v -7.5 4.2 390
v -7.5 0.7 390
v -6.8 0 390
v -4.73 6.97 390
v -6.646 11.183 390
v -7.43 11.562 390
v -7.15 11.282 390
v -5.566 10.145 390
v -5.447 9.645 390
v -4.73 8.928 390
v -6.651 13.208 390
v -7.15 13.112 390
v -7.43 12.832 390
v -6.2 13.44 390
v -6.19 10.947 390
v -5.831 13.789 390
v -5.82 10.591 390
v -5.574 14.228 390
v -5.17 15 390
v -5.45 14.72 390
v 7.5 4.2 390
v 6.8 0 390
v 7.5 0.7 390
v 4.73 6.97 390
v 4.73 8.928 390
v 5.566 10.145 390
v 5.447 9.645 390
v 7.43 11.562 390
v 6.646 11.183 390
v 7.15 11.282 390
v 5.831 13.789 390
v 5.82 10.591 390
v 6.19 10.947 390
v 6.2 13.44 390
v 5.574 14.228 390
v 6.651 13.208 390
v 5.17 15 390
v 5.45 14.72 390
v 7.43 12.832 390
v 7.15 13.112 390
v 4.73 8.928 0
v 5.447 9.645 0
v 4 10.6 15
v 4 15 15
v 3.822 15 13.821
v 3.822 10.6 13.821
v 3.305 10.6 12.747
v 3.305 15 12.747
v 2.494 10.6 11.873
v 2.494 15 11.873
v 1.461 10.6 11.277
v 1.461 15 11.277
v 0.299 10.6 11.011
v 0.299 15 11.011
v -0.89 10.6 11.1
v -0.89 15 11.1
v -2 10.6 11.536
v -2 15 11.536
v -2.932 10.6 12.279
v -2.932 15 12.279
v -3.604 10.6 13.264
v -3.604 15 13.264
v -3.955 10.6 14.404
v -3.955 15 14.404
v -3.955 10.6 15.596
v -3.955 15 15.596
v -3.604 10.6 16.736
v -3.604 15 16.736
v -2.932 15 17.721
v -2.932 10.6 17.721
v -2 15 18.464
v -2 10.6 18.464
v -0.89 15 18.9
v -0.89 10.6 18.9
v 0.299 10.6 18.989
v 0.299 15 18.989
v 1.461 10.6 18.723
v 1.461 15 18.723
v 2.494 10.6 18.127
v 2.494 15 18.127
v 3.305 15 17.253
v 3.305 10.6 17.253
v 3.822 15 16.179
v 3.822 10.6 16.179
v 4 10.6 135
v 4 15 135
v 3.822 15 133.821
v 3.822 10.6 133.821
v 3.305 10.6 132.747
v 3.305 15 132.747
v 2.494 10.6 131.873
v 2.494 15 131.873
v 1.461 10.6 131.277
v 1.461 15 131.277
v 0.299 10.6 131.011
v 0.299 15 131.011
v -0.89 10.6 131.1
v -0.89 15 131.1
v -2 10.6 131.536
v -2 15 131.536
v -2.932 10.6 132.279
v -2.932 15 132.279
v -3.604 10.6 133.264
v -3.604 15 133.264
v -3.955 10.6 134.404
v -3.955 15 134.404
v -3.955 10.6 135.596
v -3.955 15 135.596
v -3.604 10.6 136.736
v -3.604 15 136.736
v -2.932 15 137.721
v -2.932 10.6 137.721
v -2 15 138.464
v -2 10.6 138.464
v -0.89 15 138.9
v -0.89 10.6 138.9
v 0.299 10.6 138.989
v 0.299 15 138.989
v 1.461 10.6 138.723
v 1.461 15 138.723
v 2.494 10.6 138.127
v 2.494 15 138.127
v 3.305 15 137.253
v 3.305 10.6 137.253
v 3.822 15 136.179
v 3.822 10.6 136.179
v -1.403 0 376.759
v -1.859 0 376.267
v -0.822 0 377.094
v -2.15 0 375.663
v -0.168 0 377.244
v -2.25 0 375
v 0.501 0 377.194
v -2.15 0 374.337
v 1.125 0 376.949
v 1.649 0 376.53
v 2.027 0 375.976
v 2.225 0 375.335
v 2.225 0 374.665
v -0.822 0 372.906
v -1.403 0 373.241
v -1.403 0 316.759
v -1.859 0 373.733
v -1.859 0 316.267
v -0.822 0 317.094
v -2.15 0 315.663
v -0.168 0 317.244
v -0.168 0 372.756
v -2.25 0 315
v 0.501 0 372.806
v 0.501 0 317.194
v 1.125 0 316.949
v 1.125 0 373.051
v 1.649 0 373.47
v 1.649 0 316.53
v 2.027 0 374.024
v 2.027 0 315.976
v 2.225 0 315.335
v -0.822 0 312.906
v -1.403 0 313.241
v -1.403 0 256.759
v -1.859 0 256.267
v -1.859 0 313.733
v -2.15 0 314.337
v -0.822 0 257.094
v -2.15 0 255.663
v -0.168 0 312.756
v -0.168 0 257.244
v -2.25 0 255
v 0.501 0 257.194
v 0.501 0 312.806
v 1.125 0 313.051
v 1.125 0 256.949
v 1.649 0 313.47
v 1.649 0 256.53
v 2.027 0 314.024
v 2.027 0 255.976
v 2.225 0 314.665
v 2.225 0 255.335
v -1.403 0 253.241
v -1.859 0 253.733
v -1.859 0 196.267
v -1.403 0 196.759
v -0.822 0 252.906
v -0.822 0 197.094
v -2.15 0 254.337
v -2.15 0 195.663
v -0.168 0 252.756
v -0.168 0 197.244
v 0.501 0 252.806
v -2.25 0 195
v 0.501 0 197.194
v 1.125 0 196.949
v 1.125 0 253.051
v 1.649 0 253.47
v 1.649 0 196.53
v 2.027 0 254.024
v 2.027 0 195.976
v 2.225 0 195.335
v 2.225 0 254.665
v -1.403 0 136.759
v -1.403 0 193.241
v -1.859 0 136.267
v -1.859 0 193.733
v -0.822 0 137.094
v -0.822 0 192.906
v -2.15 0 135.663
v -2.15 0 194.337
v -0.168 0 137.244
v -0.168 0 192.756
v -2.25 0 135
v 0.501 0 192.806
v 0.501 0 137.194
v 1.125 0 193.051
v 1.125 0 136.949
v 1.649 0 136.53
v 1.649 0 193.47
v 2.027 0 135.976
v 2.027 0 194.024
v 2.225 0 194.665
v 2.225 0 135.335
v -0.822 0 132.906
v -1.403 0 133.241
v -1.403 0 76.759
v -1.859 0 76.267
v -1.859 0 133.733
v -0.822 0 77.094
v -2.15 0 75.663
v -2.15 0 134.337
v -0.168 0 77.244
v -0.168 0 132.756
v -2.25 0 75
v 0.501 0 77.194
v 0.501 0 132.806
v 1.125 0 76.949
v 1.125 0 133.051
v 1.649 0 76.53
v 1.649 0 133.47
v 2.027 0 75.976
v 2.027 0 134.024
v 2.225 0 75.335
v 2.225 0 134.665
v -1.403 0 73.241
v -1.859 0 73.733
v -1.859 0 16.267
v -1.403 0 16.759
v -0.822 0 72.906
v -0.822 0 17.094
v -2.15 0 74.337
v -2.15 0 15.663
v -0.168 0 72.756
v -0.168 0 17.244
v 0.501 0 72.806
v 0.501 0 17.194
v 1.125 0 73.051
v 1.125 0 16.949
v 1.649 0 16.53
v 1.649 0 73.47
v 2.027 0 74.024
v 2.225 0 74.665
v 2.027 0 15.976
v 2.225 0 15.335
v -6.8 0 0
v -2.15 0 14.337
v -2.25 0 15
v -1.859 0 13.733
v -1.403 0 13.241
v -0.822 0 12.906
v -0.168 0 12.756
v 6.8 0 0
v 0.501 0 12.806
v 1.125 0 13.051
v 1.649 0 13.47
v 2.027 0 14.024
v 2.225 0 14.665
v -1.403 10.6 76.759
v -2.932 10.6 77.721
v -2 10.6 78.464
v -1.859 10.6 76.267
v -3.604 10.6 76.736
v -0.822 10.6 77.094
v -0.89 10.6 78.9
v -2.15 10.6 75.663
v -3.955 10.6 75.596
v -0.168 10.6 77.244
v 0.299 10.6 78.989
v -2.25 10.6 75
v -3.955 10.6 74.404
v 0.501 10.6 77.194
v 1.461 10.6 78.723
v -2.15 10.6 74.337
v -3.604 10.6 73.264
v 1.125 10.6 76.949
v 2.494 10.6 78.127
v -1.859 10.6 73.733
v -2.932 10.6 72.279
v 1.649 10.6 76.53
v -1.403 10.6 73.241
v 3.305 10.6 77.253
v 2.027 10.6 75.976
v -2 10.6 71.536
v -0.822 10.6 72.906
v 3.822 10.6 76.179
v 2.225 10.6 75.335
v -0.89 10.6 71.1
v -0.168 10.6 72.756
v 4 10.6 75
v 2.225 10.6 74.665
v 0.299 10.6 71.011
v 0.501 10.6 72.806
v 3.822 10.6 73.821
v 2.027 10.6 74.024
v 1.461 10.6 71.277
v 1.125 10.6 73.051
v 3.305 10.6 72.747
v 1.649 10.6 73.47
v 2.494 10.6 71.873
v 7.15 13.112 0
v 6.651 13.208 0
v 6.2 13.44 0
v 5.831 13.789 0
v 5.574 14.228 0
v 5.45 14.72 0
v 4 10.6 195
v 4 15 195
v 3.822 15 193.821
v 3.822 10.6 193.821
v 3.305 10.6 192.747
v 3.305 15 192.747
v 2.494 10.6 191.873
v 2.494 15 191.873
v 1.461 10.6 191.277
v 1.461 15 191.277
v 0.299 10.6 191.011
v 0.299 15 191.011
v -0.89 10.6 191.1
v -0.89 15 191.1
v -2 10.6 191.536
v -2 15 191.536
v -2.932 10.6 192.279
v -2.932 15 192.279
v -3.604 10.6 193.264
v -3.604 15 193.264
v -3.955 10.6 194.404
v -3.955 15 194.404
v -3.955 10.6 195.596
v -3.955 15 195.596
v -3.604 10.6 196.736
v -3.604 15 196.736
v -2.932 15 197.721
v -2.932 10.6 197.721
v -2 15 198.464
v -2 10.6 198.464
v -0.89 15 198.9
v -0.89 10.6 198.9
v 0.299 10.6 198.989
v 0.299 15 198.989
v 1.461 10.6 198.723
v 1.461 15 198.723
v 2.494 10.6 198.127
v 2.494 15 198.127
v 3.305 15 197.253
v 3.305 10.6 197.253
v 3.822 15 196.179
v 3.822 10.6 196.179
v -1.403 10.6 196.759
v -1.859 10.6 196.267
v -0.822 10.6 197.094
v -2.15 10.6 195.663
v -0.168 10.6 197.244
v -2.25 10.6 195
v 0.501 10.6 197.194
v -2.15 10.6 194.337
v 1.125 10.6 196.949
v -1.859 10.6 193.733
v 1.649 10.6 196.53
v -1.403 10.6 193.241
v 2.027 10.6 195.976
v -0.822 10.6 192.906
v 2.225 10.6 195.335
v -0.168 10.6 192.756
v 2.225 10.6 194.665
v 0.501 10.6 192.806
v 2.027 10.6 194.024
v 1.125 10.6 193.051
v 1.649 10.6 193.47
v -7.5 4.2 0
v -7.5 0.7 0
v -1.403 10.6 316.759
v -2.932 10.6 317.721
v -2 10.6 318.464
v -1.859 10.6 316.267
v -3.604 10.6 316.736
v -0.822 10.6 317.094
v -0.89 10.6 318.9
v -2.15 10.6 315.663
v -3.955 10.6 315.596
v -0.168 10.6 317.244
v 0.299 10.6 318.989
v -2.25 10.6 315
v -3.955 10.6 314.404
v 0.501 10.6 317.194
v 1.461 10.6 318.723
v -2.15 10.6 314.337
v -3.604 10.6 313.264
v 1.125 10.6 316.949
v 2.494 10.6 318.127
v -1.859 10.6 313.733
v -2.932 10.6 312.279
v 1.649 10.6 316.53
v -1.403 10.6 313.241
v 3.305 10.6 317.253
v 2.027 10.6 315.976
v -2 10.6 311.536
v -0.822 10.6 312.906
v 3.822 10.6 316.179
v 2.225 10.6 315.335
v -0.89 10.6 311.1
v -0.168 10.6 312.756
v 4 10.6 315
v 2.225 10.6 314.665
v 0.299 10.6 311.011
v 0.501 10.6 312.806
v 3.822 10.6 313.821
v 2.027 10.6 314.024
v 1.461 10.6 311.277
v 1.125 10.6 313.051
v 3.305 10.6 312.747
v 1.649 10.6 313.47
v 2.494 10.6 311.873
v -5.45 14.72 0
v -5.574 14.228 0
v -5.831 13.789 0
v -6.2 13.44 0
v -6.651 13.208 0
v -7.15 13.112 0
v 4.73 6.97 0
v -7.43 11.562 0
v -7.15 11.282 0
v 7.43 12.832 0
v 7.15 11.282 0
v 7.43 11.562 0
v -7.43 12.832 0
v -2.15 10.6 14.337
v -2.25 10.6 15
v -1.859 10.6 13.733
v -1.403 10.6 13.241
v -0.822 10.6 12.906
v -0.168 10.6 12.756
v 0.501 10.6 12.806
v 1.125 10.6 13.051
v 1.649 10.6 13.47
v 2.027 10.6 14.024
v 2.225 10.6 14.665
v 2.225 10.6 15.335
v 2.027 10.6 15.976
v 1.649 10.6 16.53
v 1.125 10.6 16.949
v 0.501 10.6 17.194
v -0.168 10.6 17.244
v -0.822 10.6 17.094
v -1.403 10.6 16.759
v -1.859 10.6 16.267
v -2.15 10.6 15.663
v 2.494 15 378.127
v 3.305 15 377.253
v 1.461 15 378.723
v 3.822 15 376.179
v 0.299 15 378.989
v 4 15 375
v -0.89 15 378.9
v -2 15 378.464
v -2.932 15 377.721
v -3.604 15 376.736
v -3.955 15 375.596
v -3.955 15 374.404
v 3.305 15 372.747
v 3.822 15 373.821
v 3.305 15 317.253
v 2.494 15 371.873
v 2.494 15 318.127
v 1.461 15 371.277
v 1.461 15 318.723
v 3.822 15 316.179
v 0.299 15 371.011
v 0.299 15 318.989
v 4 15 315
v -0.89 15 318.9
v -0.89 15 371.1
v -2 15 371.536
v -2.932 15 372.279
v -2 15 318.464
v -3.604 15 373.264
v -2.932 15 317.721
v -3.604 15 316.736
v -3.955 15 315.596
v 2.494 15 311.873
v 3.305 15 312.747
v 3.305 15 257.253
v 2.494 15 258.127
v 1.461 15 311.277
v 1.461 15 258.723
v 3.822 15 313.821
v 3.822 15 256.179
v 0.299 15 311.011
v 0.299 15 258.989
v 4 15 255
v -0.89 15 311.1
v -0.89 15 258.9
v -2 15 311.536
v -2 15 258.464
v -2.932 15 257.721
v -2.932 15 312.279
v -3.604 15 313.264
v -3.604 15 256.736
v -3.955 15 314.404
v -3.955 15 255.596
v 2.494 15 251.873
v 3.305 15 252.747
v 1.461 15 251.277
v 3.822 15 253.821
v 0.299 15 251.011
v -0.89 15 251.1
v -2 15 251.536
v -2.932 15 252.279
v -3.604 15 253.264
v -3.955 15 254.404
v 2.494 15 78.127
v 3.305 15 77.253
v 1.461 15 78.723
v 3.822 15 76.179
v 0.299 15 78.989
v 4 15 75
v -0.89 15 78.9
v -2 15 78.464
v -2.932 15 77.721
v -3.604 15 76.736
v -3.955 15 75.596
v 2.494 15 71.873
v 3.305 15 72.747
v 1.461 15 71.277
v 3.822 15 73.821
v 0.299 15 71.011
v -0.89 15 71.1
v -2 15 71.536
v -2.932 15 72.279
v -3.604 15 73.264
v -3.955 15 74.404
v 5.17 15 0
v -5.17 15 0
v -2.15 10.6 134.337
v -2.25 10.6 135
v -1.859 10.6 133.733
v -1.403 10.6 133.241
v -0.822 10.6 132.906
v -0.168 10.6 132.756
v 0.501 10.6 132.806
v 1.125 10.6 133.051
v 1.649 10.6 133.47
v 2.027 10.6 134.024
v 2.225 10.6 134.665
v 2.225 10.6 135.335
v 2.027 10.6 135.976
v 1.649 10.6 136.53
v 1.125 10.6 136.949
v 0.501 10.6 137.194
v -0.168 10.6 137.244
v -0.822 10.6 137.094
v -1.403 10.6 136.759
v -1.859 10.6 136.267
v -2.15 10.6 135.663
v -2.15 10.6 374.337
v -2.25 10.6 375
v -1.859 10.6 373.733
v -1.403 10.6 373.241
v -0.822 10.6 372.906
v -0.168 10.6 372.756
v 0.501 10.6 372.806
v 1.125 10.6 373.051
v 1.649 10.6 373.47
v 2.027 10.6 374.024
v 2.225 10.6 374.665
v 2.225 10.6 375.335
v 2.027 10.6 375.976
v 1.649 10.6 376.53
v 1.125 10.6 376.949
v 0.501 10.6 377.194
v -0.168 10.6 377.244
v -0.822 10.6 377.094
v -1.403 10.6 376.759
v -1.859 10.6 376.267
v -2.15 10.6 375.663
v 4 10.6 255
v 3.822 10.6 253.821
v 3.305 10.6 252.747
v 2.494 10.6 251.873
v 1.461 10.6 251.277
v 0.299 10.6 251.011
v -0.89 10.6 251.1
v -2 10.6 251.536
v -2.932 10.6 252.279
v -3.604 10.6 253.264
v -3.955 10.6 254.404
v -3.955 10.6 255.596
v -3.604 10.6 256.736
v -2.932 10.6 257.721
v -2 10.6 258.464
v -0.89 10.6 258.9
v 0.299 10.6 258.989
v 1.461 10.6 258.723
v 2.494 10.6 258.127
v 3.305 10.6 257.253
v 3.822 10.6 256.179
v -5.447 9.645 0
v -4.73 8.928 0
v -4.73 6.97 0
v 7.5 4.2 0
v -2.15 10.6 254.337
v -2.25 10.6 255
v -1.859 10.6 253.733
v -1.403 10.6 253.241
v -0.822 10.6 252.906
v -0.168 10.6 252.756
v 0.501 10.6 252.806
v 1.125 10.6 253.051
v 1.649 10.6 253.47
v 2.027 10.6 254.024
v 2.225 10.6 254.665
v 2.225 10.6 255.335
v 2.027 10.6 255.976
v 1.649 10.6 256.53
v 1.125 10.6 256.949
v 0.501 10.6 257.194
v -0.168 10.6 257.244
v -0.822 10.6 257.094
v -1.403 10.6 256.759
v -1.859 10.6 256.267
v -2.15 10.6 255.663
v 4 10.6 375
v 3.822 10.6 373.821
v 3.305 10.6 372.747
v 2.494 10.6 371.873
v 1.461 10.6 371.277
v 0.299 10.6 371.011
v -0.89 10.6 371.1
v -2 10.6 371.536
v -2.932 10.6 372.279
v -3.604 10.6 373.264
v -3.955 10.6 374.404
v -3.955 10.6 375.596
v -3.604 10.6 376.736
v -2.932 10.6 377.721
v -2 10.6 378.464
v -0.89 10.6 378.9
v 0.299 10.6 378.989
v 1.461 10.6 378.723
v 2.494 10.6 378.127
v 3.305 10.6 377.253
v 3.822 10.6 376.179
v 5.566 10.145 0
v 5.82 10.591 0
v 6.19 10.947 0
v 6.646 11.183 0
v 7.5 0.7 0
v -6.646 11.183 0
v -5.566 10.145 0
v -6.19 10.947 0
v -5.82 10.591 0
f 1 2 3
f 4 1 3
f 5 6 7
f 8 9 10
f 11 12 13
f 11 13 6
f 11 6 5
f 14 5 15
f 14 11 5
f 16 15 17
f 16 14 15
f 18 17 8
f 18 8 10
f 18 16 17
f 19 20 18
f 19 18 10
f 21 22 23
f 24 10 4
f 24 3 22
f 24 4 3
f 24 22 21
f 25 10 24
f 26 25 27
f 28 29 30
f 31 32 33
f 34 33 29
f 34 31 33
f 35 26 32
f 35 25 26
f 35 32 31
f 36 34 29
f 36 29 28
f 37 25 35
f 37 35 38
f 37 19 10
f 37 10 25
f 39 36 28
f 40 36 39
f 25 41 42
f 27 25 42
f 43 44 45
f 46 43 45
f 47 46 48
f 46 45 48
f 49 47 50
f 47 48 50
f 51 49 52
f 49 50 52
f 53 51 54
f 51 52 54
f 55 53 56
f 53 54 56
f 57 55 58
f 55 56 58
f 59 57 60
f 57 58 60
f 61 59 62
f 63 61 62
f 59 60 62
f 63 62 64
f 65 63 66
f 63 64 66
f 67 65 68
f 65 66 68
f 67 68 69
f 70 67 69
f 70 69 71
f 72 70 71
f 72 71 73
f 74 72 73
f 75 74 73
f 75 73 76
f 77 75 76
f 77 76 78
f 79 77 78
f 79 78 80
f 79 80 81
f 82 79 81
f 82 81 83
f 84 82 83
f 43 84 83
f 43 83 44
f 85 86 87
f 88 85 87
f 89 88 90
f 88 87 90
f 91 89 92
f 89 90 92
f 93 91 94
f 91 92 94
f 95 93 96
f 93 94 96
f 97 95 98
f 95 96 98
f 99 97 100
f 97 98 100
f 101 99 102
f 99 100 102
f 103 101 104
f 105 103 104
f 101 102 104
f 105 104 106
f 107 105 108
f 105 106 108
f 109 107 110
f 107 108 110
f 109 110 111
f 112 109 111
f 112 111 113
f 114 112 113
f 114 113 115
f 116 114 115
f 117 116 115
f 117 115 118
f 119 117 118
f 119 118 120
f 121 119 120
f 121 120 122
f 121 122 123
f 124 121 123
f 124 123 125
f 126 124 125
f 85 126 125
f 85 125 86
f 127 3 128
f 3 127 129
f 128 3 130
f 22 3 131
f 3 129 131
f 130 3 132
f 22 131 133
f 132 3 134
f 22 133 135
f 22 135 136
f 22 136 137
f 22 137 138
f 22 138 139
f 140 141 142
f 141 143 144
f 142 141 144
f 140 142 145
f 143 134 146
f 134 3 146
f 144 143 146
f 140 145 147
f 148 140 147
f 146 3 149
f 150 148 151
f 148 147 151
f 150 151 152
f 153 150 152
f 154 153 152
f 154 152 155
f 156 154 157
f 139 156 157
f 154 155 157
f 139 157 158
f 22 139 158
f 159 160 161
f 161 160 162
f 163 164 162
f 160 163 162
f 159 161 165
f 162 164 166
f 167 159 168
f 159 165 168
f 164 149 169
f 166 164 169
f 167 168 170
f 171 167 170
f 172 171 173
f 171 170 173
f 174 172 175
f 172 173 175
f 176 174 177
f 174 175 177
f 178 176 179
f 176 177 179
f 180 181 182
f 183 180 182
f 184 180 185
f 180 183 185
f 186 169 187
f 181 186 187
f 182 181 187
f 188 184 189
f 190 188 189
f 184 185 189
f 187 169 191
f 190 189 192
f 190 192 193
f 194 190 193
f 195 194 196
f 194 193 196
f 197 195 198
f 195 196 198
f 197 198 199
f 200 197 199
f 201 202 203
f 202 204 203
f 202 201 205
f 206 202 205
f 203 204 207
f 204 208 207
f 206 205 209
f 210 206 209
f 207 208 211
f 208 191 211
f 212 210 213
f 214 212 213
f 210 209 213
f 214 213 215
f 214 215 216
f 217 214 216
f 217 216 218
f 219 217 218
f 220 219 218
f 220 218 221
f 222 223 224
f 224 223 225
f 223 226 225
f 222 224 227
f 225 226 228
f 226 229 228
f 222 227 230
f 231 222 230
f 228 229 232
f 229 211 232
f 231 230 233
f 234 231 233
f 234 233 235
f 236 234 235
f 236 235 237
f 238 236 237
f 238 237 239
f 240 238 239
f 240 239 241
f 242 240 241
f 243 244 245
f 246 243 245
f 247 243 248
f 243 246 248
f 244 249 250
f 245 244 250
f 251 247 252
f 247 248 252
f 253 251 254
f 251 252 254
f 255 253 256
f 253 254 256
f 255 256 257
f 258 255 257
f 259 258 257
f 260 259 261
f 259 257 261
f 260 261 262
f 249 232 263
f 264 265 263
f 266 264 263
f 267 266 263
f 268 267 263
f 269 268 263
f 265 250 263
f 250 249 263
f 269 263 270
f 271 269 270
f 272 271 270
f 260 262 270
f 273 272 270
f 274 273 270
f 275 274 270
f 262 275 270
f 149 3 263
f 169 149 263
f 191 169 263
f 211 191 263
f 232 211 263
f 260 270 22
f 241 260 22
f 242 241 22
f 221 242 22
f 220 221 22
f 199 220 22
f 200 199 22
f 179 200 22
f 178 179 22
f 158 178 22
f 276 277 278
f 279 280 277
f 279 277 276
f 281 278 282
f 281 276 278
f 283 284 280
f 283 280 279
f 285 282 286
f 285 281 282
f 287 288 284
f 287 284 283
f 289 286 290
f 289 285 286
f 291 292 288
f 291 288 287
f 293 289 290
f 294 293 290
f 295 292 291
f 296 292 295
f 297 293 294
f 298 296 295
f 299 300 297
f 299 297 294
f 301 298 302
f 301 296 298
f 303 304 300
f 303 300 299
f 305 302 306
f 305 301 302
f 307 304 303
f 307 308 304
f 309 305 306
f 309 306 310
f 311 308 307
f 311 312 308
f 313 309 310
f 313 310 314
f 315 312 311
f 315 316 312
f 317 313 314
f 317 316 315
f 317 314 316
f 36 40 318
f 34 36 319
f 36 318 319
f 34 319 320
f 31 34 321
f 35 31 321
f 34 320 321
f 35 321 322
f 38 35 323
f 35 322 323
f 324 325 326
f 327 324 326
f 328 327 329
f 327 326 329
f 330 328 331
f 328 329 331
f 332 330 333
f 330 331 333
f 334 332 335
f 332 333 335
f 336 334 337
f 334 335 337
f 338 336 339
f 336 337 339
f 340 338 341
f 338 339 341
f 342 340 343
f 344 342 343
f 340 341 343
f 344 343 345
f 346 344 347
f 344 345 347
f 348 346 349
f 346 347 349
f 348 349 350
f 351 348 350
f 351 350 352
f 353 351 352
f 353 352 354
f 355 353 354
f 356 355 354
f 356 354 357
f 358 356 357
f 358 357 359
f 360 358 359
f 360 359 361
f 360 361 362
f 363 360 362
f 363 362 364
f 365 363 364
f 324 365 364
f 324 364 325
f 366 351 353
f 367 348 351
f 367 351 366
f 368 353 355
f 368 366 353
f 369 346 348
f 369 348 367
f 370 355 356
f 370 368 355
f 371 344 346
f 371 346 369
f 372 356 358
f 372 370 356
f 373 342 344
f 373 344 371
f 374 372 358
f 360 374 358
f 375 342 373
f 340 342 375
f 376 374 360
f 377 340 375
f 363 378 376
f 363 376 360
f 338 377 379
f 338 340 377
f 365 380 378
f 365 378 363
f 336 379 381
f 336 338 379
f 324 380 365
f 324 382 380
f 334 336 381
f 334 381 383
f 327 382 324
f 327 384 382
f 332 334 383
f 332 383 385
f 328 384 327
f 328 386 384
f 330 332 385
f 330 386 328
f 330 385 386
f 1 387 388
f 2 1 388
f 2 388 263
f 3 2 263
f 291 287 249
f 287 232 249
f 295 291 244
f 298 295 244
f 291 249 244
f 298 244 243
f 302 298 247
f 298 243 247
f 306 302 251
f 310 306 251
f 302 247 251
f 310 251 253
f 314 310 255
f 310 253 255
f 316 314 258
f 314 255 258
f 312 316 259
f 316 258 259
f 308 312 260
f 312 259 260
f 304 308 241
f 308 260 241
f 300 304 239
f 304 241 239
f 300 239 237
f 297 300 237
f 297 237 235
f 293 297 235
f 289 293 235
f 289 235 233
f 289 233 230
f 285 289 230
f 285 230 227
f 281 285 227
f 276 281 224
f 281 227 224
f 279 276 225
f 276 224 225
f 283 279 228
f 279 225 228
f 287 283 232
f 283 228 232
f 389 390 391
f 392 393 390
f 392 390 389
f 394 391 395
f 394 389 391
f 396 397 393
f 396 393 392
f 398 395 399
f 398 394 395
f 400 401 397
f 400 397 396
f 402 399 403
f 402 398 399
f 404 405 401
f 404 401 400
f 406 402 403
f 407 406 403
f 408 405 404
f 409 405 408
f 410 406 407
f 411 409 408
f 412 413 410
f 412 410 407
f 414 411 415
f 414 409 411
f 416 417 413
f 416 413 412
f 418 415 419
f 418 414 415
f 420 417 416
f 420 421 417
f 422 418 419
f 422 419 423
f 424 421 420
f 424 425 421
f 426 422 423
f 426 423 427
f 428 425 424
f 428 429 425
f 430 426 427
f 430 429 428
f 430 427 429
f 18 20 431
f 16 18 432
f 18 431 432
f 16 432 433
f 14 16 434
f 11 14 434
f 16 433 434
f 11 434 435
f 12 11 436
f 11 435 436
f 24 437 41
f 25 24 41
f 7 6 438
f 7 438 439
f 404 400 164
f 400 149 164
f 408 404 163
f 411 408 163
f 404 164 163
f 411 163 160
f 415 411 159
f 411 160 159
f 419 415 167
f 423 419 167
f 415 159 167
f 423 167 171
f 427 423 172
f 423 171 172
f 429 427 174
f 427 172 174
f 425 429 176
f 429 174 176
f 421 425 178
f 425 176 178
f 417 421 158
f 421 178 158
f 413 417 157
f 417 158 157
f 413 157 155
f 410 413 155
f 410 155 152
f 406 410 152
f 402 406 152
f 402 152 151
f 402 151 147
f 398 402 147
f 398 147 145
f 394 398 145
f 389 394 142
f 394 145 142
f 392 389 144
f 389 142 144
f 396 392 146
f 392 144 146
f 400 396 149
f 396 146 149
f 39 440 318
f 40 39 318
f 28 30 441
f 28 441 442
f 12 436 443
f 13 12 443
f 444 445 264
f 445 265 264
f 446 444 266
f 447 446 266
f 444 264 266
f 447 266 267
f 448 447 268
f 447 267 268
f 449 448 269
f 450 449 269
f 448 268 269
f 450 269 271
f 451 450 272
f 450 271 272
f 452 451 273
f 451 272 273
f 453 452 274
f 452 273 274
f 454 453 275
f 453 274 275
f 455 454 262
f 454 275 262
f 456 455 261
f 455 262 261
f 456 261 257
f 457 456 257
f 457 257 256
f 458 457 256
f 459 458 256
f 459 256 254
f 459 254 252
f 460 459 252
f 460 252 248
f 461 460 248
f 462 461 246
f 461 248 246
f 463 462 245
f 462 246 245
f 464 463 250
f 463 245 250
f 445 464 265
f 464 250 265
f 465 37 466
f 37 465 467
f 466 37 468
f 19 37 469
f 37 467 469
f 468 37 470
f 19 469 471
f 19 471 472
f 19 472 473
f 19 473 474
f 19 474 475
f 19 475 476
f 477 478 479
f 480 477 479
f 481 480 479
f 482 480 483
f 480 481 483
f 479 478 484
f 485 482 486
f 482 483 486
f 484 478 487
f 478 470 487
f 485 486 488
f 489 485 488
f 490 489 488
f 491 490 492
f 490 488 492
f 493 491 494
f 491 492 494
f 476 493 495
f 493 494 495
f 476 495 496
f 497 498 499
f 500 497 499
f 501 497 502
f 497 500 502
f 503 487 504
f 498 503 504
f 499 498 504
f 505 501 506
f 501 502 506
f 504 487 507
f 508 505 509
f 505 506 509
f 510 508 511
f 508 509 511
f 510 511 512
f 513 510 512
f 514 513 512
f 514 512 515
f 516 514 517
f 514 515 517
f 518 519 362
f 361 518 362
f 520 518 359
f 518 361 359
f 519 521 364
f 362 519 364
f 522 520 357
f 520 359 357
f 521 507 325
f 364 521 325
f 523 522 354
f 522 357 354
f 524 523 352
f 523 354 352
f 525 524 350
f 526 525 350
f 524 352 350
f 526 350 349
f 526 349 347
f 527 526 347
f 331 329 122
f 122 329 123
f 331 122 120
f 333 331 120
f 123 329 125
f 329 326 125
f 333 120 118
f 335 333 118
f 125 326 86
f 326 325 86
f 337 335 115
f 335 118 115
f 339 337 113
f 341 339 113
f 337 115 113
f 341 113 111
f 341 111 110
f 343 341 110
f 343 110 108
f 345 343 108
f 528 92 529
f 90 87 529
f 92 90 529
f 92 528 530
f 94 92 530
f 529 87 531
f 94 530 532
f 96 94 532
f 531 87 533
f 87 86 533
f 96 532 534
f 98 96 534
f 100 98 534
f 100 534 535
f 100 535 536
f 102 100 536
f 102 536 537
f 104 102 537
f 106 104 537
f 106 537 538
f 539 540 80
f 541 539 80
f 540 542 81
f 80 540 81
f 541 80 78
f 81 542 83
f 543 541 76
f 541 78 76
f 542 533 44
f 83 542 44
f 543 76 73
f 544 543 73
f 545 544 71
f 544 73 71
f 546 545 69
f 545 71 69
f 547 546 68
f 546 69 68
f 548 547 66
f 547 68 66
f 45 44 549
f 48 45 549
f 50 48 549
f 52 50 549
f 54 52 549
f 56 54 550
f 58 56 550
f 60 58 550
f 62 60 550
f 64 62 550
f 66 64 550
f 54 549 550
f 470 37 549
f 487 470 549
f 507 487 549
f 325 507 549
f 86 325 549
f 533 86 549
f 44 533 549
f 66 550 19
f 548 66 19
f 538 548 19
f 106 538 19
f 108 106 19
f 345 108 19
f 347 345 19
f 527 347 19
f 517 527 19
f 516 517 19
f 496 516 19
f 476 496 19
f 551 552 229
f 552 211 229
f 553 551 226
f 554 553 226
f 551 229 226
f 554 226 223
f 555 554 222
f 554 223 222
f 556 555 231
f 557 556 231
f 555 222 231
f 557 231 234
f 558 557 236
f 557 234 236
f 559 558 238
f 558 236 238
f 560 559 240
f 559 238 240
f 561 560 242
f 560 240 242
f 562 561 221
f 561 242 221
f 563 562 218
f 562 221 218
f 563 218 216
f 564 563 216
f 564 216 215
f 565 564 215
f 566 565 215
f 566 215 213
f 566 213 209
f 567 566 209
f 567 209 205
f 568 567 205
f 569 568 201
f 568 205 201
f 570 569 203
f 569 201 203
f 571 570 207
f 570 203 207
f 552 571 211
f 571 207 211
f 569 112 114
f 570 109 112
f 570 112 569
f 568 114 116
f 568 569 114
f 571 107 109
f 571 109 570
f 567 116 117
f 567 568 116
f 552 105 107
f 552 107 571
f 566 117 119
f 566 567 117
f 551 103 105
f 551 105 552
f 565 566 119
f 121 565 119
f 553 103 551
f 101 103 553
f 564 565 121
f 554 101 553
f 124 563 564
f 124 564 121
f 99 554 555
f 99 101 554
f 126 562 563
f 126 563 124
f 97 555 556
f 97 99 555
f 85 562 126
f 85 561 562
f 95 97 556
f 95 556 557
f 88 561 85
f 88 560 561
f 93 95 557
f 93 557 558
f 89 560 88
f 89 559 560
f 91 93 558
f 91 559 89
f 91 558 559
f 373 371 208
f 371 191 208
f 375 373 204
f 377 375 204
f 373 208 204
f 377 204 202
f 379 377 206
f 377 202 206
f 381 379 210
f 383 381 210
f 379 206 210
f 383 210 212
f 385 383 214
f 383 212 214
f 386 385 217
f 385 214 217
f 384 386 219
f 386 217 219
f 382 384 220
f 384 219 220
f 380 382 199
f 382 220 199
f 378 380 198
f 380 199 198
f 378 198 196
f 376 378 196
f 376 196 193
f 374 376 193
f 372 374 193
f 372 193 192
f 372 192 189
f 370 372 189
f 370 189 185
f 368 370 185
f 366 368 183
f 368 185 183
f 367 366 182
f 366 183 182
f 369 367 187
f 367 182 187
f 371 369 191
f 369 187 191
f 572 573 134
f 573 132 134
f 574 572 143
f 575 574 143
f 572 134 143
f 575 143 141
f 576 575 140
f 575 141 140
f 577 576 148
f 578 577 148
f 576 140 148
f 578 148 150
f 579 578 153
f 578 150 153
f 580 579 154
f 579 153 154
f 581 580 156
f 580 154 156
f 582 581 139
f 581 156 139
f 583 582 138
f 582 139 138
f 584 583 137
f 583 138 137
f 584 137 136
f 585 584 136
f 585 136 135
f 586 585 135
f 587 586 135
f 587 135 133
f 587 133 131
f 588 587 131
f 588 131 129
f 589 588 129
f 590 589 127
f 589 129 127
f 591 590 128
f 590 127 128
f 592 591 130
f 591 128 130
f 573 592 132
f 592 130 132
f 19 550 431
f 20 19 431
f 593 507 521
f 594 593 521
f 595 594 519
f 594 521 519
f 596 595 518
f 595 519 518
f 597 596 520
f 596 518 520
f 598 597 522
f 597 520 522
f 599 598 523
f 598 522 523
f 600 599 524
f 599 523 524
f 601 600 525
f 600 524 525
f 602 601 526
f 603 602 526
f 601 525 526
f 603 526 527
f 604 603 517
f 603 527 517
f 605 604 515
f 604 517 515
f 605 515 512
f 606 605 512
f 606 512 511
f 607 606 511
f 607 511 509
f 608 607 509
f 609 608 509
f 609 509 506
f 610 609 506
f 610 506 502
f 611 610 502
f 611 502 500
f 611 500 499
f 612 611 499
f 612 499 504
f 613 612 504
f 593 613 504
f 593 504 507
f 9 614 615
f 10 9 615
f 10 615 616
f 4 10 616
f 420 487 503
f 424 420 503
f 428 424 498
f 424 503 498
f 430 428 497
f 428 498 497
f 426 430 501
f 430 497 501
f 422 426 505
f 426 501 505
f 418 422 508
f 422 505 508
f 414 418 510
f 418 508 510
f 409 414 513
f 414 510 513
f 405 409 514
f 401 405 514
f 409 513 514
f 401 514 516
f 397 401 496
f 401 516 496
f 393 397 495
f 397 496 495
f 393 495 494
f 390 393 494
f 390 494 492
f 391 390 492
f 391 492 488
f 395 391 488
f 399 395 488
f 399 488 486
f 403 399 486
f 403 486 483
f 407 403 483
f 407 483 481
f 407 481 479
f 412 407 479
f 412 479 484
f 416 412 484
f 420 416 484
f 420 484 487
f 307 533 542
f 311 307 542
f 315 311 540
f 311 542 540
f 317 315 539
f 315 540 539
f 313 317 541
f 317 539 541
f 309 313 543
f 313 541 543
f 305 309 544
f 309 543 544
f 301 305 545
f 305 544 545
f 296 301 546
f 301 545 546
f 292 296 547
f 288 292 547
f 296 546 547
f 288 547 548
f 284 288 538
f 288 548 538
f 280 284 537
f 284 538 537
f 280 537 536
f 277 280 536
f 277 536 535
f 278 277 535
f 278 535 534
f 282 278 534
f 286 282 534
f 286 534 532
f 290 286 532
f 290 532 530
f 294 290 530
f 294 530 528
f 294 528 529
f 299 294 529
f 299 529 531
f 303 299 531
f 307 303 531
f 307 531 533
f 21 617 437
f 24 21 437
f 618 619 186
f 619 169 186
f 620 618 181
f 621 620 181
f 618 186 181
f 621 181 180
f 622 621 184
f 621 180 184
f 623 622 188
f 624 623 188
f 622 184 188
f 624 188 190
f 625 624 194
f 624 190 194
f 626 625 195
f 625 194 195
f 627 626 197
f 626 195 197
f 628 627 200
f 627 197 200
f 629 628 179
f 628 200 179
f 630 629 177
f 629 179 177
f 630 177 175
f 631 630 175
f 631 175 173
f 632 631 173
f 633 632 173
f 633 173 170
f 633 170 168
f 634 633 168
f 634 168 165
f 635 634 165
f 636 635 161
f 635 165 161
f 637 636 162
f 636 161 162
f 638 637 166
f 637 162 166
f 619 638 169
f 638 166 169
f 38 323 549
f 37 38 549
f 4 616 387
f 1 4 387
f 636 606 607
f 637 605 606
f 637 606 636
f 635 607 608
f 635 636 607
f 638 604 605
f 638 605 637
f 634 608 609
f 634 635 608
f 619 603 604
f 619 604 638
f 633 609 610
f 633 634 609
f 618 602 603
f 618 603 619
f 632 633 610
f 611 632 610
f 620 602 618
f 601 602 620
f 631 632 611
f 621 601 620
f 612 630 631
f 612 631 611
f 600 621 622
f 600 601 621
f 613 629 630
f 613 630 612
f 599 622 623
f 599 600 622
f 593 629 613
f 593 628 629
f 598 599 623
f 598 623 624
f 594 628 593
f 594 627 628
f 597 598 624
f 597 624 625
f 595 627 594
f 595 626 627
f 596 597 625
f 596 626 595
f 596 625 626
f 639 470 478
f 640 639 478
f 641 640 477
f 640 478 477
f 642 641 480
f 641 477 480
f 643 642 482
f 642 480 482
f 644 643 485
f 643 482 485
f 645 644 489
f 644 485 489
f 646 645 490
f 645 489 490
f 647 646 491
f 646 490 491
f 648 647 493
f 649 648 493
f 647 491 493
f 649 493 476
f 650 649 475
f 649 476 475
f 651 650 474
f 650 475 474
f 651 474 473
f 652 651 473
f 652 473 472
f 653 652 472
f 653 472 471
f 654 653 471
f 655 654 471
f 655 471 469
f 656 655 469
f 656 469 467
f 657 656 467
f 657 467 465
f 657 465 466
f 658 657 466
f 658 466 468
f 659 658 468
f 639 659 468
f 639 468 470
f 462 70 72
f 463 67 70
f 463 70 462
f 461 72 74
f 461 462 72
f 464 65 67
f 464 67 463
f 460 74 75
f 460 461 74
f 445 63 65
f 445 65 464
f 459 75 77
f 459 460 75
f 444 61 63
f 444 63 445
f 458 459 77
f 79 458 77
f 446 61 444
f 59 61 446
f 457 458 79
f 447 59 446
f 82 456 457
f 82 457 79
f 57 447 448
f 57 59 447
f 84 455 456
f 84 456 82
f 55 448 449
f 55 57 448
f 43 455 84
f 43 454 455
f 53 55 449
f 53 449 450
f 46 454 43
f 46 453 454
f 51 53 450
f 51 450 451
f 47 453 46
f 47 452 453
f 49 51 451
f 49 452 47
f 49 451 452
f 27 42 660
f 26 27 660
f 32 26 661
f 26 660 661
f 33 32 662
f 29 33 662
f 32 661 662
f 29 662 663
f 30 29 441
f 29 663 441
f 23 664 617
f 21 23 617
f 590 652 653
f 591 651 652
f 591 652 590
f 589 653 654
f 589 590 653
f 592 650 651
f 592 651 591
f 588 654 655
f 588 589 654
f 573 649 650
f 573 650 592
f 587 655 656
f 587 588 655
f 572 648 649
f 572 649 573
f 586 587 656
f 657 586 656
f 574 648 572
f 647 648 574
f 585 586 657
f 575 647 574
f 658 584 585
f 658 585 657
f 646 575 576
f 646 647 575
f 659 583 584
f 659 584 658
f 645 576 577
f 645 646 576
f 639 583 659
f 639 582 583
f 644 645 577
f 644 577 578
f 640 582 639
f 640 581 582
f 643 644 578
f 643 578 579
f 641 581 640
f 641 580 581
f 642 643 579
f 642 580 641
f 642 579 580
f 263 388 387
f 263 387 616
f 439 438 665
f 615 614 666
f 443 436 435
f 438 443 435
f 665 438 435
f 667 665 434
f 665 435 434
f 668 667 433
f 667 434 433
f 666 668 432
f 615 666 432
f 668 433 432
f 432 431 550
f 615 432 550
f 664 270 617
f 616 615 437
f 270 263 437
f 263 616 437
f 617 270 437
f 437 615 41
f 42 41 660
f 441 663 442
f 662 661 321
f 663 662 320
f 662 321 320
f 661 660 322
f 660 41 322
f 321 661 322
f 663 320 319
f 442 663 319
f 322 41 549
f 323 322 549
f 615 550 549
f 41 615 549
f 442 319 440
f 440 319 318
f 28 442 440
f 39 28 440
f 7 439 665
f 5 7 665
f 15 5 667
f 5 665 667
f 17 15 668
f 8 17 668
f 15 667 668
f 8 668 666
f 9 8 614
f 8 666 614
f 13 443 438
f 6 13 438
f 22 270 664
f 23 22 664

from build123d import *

# Parameters (mm, degrees)
BOSS_EXTRUDE1_DEPTH                                 = 390
CBORE_FOR_M4_HEX_SOCKET_HEAD_CAP_SCREW3_D           = 4.5
CBORE_FOR_M4_HEX_SOCKET_HEAD_CAP_SCREW3_CBORE_D     = 8
CBORE_FOR_M4_HEX_SOCKET_HEAD_CAP_SCREW3_CBORE_DEPTH = 4.4


with BuildPart() as part:
    # esboco-convertido → Boss-Extrude1 (new body)
    with BuildSketch(Plane.XY):
        with BuildLine():
            Line((-5.17, 15), (-5.45, 14.72))
            ThreePointArc((-5.45, 14.72), (-6.002972259, 13.601894134), (-7.15, 13.111724361))
            Line((-7.15, 13.111724361), (-7.43, 12.831724361))
            Line((-7.43, 12.831724361), (-7.43, 11.562021626))
            Line((-7.43, 11.562021626), (-7.15, 11.282021626))
            ThreePointArc((-7.15, 11.282021626), (-5.99259296, 10.781953917), (-5.447208, 9.645198))
            Line((-5.447208, 9.645198), (-4.73, 8.92799))
            Line((-4.73, 8.92799), (-4.73, 6.97))
            Line((-4.73, 6.97), (-7.5, 4.2))
            Line((-7.5, 4.2), (-7.5, 0.7))
            Line((-7.5, 0.7), (-6.8, 0))
            Line((-6.8, 0), (6.8, 0))
            Line((6.8, 0), (7.5, 0.7))
            Line((7.5, 0.7), (7.5, 4.2))
            Line((7.5, 4.2), (4.73, 6.97))
            Line((4.73, 6.97), (4.73, 8.92799))
            Line((4.73, 8.92799), (5.447208, 9.645198))
            ThreePointArc((5.447208, 9.645198), (5.99259296, 10.781953917), (7.15, 11.282021626))
            Line((7.15, 11.282021626), (7.43, 11.562021626))
            Line((7.43, 11.562021626), (7.43, 12.831724361))
            Line((7.43, 12.831724361), (7.15, 13.111724361))
            ThreePointArc((7.15, 13.111724361), (6.002972259, 13.601894134), (5.45, 14.72))
            Line((5.45, 14.72), (5.17, 15))
            Line((5.17, 15), (-5.17, 15))
        make_face()
    extrude(amount=BOSS_EXTRUDE1_DEPTH)

    # CBORE for M4 Hex Socket Head Cap Screw3 (through all)
    with Locations(Plane(origin=(0, 15, 0), x_dir=(1, 0, 0), z_dir=(0, 1, 0))):
        with Locations((0, -15), (0, -375), (0, -315), (0, -255), (0, -195), (0, -135), (0, -75)):
            CounterBoreHole(CBORE_FOR_M4_HEX_SOCKET_HEAD_CAP_SCREW3_D / 2, CBORE_FOR_M4_HEX_SOCKET_HEAD_CAP_SCREW3_CBORE_D / 2, CBORE_FOR_M4_HEX_SOCKET_HEAD_CAP_SCREW3_CBORE_DEPTH)


solid = part.part
